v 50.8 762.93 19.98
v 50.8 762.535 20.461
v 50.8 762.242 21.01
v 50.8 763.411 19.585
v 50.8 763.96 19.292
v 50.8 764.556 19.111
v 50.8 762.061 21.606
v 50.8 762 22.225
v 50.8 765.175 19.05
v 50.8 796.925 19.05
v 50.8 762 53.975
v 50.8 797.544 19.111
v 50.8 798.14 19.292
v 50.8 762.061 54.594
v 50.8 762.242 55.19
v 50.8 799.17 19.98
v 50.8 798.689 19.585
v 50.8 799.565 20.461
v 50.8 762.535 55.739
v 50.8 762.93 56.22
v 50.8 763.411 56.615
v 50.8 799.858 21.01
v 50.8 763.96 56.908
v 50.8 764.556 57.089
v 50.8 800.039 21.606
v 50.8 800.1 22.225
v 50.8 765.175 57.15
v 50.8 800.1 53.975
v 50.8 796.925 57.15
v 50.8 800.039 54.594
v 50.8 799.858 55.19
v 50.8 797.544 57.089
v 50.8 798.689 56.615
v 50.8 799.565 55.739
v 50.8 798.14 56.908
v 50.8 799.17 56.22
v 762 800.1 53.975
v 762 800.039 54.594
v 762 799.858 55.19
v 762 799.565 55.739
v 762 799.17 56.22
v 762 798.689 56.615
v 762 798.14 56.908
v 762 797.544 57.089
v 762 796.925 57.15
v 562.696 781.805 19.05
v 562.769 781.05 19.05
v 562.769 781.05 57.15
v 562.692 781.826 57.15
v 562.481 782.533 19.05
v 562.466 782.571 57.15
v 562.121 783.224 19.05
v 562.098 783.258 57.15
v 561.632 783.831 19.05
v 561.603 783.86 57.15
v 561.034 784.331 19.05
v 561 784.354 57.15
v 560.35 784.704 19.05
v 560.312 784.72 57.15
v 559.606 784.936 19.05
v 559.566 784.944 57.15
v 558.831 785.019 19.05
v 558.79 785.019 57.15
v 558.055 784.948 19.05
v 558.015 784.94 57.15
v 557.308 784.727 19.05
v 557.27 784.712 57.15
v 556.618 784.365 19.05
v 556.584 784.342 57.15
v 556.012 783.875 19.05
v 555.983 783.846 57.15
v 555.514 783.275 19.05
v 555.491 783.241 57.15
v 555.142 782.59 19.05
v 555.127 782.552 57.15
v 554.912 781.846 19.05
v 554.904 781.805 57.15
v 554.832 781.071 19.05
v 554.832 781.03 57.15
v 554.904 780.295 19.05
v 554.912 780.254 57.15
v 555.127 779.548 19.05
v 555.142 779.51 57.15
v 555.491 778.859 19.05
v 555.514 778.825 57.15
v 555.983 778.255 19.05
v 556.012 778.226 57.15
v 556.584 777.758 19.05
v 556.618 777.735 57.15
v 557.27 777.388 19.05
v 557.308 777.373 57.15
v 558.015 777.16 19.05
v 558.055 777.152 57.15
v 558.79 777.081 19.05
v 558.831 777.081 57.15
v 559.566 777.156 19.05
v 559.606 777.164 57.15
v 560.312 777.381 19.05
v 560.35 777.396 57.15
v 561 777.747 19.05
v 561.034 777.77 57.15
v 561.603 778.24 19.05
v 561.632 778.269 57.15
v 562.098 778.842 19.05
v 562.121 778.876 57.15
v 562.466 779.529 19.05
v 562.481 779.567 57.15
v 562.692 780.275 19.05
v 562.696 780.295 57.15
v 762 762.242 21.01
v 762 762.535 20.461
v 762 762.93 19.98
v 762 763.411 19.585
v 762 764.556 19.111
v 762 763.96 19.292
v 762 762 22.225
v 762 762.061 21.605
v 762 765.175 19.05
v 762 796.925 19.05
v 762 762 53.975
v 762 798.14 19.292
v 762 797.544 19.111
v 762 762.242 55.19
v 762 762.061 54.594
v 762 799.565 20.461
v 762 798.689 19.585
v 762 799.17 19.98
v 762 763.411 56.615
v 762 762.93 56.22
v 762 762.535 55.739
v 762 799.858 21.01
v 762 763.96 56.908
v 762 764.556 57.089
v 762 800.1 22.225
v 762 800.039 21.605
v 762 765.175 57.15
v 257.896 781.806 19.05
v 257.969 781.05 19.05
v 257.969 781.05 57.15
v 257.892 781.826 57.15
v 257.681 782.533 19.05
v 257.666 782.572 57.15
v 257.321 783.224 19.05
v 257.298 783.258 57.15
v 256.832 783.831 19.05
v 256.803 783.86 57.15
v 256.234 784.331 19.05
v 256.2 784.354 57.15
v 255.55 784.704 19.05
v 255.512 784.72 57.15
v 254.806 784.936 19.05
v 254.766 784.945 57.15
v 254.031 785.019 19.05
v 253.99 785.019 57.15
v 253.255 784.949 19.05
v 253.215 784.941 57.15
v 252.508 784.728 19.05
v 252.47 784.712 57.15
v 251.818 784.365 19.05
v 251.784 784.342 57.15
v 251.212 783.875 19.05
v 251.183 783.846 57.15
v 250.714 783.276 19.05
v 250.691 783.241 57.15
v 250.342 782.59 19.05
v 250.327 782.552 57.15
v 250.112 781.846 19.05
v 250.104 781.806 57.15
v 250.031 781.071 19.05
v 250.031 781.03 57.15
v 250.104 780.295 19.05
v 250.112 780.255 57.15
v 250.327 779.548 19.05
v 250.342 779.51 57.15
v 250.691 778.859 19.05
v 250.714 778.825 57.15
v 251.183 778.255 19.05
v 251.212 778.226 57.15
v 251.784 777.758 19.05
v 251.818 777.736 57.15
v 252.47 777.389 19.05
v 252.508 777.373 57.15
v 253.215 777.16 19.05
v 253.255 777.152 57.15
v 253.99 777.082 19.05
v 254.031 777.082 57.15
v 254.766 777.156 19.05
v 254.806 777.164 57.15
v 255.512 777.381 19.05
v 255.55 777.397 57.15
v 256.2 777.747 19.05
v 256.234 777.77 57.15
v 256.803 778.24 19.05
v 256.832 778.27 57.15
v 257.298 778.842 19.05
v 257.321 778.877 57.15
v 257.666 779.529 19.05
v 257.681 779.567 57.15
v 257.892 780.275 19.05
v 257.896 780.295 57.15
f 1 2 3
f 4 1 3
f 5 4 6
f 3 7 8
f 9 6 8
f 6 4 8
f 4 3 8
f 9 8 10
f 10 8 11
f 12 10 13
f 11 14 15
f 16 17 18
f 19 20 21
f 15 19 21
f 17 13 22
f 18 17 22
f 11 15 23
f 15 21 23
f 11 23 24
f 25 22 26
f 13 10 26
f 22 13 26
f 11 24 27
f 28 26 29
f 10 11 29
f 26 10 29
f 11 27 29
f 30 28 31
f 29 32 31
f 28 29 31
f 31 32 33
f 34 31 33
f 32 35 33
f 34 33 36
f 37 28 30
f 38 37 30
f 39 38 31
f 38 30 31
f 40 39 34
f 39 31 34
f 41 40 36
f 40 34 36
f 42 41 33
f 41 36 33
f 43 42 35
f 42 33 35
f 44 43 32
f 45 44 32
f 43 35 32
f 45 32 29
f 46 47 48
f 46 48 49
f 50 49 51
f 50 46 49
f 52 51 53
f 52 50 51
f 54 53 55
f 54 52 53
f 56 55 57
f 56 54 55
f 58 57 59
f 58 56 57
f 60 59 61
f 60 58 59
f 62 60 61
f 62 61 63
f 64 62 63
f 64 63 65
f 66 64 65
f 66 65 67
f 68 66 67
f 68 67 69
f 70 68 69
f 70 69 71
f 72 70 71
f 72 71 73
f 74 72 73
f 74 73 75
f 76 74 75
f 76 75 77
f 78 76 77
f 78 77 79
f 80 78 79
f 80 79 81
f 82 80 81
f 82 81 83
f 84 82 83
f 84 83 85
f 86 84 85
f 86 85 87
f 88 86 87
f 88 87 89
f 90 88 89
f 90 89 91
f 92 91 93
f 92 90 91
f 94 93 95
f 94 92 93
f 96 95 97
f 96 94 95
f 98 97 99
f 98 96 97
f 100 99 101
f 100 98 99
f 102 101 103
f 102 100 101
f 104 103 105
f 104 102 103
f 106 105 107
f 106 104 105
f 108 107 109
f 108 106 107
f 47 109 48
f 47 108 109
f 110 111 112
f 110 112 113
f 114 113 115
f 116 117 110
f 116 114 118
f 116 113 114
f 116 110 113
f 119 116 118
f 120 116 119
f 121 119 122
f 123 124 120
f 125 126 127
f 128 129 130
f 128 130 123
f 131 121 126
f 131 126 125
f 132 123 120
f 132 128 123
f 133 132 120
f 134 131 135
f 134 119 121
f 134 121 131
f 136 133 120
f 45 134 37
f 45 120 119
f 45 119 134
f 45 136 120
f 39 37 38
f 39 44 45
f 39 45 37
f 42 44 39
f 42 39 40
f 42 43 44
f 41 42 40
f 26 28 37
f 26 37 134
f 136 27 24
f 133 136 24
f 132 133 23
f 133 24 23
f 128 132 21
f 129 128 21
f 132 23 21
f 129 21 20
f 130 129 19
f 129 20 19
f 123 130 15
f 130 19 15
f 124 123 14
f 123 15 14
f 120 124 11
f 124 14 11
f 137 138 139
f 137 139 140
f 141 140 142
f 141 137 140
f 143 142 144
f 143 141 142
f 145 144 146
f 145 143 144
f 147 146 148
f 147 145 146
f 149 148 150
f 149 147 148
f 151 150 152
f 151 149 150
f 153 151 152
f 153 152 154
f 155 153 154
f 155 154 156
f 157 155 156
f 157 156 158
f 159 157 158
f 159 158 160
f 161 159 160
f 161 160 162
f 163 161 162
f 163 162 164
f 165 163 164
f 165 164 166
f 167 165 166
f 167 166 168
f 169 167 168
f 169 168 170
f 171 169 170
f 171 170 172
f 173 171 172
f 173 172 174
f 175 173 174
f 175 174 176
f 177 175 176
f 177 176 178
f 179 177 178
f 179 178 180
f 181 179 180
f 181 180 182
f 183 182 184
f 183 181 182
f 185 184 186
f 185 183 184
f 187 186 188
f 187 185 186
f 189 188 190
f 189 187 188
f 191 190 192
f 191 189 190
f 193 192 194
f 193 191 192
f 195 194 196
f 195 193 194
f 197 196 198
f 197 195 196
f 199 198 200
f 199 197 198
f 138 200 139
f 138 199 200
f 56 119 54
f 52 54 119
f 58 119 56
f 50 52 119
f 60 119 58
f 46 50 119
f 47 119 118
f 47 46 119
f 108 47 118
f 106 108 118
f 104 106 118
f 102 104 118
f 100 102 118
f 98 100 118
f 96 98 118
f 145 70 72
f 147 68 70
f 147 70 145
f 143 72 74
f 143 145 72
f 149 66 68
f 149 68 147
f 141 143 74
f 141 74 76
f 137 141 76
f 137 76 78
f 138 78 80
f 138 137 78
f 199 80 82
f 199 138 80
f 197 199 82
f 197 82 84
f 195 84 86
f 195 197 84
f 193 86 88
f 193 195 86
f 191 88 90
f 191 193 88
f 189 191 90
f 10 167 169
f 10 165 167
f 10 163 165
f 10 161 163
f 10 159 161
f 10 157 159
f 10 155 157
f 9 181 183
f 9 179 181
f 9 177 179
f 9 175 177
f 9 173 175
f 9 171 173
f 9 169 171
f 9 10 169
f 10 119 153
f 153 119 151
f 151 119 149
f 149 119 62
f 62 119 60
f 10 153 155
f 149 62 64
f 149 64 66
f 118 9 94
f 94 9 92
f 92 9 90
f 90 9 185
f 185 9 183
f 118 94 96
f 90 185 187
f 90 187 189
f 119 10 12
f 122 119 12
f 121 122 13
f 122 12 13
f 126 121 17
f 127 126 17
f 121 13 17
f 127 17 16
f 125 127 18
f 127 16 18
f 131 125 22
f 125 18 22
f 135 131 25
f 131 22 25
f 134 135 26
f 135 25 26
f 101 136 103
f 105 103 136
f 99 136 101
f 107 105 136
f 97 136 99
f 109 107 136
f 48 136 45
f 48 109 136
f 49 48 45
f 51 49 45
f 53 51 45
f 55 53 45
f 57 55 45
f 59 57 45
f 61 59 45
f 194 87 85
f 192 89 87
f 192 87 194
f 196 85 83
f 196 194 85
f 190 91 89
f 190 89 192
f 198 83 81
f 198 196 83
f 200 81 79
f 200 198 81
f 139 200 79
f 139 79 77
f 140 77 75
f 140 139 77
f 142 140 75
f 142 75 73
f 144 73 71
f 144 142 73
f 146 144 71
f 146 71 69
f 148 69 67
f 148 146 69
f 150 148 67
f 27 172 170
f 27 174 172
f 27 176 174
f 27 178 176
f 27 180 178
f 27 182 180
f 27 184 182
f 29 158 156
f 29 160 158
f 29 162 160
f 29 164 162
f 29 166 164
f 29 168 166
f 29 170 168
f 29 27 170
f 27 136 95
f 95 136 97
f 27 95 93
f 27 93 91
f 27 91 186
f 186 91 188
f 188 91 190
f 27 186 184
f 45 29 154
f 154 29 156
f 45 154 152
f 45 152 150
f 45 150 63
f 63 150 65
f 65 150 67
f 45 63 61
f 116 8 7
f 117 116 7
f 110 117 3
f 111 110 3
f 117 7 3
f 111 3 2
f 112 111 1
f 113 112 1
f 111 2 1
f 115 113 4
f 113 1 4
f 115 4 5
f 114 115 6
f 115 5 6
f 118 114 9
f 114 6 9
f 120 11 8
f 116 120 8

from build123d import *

# Parameters (mm, degrees)
CYLINDER_R                 = 3.96875
CYLINDER_DEPTH             = 50.8
EXTRUDE014_DEPTH           = 711.2
EXTRUDE014_ROLL_ANGLE      = -90
EXTRUDE014_PLACEMENT_ANGLE = -90
LINK022_ROLL_ANGLE         = -179.999993
LINK022_PITCH_ANGLE        = 7e-06


with BuildPart() as cylinder:
    # Cylinder → Cylinder (new body)
    with BuildSketch(Plane(origin=(381, 203.2, 16.66875), x_dir=(1, 0, 0), z_dir=(0, 0, 1))):
        Circle(CYLINDER_R)
    extrude(amount=CYLINDER_DEPTH)


with BuildPart() as cylinder005:
    # Link082 base: copy of Cylinder
    add(cylinder.part)


with BuildPart() as cylinder005_1:
    # Link082 placement: moved
    add(cylinder005.part.moved(Location((177.800232, 577.85011, -3.968745))))


with BuildPart() as cylinder004:
    # Link081 base: copy of Cylinder
    add(cylinder.part)


with BuildPart() as cylinder004_1:
    # Link081 placement: moved
    add(cylinder004.part.moved(Location((-126.999817, 577.850354, -3.968746))))


with BuildPart() as baffle_frame_b:
    # Sketch014 → Extrude014 (new body)
    with BuildSketch(Plane.XY):
        with BuildLine():
            Line((0, 34.925), (0, 3.175))
            ThreePointArc((0, 3.175), (0.929936, 0.929936), (3.175, 0))
            Line((34.925, 0), (3.175, 0))
            ThreePointArc((34.925, 0), (37.170064, 0.929936), (38.1, 3.175))
            Line((38.1, 34.925), (38.1, 3.175))
            ThreePointArc((38.1, 34.925), (37.170064, 37.170064), (34.925, 38.1))
            Line((3.175, 38.1), (34.925, 38.1))
            ThreePointArc((3.175, 38.1), (0.929936, 37.170064), (0, 34.925))
        make_face()
    extrude(amount=EXTRUDE014_DEPTH)


with BuildPart() as baffle_frame_b_1:
    # Extrude014 roll: moved
    add(baffle_frame_b.part.rotate(Axis((0, 0, 0), (1, 0, 0)), EXTRUDE014_ROLL_ANGLE))


with BuildPart() as baffle_frame_b_2:
    # Extrude014 placement: moved
    add(baffle_frame_b_1.part.moved(Location((50.8, 800.1, 196.85))).rotate(Axis((50.8, 800.1, 196.85), (0, 0, 1)), EXTRUDE014_PLACEMENT_ANGLE))


with BuildPart() as baffle_frame_b_3:
    # Link022 roll: moved
    add(baffle_frame_b_2.part.rotate(Axis((0, 0, 0), (1, 0, 0)), LINK022_ROLL_ANGLE))


with BuildPart() as baffle_frame_b_4:
    # Link022 pitch: moved
    add(baffle_frame_b_3.part.rotate(Axis((0, 0, 0), (0, 1, 0)), LINK022_PITCH_ANGLE))


with BuildPart() as baffle_frame_b_5:
    # Link022 placement: moved
    add(baffle_frame_b_4.part.moved(Location((3e-05, 1562.099977, 215.900066))))

    # Cut004: cut Cylinder004
    add(cylinder004_1.part, mode=Mode.SUBTRACT)

    # Cut005: cut Cylinder005
    add(cylinder005_1.part, mode=Mode.SUBTRACT)


solid = baffle_frame_b_5.part
